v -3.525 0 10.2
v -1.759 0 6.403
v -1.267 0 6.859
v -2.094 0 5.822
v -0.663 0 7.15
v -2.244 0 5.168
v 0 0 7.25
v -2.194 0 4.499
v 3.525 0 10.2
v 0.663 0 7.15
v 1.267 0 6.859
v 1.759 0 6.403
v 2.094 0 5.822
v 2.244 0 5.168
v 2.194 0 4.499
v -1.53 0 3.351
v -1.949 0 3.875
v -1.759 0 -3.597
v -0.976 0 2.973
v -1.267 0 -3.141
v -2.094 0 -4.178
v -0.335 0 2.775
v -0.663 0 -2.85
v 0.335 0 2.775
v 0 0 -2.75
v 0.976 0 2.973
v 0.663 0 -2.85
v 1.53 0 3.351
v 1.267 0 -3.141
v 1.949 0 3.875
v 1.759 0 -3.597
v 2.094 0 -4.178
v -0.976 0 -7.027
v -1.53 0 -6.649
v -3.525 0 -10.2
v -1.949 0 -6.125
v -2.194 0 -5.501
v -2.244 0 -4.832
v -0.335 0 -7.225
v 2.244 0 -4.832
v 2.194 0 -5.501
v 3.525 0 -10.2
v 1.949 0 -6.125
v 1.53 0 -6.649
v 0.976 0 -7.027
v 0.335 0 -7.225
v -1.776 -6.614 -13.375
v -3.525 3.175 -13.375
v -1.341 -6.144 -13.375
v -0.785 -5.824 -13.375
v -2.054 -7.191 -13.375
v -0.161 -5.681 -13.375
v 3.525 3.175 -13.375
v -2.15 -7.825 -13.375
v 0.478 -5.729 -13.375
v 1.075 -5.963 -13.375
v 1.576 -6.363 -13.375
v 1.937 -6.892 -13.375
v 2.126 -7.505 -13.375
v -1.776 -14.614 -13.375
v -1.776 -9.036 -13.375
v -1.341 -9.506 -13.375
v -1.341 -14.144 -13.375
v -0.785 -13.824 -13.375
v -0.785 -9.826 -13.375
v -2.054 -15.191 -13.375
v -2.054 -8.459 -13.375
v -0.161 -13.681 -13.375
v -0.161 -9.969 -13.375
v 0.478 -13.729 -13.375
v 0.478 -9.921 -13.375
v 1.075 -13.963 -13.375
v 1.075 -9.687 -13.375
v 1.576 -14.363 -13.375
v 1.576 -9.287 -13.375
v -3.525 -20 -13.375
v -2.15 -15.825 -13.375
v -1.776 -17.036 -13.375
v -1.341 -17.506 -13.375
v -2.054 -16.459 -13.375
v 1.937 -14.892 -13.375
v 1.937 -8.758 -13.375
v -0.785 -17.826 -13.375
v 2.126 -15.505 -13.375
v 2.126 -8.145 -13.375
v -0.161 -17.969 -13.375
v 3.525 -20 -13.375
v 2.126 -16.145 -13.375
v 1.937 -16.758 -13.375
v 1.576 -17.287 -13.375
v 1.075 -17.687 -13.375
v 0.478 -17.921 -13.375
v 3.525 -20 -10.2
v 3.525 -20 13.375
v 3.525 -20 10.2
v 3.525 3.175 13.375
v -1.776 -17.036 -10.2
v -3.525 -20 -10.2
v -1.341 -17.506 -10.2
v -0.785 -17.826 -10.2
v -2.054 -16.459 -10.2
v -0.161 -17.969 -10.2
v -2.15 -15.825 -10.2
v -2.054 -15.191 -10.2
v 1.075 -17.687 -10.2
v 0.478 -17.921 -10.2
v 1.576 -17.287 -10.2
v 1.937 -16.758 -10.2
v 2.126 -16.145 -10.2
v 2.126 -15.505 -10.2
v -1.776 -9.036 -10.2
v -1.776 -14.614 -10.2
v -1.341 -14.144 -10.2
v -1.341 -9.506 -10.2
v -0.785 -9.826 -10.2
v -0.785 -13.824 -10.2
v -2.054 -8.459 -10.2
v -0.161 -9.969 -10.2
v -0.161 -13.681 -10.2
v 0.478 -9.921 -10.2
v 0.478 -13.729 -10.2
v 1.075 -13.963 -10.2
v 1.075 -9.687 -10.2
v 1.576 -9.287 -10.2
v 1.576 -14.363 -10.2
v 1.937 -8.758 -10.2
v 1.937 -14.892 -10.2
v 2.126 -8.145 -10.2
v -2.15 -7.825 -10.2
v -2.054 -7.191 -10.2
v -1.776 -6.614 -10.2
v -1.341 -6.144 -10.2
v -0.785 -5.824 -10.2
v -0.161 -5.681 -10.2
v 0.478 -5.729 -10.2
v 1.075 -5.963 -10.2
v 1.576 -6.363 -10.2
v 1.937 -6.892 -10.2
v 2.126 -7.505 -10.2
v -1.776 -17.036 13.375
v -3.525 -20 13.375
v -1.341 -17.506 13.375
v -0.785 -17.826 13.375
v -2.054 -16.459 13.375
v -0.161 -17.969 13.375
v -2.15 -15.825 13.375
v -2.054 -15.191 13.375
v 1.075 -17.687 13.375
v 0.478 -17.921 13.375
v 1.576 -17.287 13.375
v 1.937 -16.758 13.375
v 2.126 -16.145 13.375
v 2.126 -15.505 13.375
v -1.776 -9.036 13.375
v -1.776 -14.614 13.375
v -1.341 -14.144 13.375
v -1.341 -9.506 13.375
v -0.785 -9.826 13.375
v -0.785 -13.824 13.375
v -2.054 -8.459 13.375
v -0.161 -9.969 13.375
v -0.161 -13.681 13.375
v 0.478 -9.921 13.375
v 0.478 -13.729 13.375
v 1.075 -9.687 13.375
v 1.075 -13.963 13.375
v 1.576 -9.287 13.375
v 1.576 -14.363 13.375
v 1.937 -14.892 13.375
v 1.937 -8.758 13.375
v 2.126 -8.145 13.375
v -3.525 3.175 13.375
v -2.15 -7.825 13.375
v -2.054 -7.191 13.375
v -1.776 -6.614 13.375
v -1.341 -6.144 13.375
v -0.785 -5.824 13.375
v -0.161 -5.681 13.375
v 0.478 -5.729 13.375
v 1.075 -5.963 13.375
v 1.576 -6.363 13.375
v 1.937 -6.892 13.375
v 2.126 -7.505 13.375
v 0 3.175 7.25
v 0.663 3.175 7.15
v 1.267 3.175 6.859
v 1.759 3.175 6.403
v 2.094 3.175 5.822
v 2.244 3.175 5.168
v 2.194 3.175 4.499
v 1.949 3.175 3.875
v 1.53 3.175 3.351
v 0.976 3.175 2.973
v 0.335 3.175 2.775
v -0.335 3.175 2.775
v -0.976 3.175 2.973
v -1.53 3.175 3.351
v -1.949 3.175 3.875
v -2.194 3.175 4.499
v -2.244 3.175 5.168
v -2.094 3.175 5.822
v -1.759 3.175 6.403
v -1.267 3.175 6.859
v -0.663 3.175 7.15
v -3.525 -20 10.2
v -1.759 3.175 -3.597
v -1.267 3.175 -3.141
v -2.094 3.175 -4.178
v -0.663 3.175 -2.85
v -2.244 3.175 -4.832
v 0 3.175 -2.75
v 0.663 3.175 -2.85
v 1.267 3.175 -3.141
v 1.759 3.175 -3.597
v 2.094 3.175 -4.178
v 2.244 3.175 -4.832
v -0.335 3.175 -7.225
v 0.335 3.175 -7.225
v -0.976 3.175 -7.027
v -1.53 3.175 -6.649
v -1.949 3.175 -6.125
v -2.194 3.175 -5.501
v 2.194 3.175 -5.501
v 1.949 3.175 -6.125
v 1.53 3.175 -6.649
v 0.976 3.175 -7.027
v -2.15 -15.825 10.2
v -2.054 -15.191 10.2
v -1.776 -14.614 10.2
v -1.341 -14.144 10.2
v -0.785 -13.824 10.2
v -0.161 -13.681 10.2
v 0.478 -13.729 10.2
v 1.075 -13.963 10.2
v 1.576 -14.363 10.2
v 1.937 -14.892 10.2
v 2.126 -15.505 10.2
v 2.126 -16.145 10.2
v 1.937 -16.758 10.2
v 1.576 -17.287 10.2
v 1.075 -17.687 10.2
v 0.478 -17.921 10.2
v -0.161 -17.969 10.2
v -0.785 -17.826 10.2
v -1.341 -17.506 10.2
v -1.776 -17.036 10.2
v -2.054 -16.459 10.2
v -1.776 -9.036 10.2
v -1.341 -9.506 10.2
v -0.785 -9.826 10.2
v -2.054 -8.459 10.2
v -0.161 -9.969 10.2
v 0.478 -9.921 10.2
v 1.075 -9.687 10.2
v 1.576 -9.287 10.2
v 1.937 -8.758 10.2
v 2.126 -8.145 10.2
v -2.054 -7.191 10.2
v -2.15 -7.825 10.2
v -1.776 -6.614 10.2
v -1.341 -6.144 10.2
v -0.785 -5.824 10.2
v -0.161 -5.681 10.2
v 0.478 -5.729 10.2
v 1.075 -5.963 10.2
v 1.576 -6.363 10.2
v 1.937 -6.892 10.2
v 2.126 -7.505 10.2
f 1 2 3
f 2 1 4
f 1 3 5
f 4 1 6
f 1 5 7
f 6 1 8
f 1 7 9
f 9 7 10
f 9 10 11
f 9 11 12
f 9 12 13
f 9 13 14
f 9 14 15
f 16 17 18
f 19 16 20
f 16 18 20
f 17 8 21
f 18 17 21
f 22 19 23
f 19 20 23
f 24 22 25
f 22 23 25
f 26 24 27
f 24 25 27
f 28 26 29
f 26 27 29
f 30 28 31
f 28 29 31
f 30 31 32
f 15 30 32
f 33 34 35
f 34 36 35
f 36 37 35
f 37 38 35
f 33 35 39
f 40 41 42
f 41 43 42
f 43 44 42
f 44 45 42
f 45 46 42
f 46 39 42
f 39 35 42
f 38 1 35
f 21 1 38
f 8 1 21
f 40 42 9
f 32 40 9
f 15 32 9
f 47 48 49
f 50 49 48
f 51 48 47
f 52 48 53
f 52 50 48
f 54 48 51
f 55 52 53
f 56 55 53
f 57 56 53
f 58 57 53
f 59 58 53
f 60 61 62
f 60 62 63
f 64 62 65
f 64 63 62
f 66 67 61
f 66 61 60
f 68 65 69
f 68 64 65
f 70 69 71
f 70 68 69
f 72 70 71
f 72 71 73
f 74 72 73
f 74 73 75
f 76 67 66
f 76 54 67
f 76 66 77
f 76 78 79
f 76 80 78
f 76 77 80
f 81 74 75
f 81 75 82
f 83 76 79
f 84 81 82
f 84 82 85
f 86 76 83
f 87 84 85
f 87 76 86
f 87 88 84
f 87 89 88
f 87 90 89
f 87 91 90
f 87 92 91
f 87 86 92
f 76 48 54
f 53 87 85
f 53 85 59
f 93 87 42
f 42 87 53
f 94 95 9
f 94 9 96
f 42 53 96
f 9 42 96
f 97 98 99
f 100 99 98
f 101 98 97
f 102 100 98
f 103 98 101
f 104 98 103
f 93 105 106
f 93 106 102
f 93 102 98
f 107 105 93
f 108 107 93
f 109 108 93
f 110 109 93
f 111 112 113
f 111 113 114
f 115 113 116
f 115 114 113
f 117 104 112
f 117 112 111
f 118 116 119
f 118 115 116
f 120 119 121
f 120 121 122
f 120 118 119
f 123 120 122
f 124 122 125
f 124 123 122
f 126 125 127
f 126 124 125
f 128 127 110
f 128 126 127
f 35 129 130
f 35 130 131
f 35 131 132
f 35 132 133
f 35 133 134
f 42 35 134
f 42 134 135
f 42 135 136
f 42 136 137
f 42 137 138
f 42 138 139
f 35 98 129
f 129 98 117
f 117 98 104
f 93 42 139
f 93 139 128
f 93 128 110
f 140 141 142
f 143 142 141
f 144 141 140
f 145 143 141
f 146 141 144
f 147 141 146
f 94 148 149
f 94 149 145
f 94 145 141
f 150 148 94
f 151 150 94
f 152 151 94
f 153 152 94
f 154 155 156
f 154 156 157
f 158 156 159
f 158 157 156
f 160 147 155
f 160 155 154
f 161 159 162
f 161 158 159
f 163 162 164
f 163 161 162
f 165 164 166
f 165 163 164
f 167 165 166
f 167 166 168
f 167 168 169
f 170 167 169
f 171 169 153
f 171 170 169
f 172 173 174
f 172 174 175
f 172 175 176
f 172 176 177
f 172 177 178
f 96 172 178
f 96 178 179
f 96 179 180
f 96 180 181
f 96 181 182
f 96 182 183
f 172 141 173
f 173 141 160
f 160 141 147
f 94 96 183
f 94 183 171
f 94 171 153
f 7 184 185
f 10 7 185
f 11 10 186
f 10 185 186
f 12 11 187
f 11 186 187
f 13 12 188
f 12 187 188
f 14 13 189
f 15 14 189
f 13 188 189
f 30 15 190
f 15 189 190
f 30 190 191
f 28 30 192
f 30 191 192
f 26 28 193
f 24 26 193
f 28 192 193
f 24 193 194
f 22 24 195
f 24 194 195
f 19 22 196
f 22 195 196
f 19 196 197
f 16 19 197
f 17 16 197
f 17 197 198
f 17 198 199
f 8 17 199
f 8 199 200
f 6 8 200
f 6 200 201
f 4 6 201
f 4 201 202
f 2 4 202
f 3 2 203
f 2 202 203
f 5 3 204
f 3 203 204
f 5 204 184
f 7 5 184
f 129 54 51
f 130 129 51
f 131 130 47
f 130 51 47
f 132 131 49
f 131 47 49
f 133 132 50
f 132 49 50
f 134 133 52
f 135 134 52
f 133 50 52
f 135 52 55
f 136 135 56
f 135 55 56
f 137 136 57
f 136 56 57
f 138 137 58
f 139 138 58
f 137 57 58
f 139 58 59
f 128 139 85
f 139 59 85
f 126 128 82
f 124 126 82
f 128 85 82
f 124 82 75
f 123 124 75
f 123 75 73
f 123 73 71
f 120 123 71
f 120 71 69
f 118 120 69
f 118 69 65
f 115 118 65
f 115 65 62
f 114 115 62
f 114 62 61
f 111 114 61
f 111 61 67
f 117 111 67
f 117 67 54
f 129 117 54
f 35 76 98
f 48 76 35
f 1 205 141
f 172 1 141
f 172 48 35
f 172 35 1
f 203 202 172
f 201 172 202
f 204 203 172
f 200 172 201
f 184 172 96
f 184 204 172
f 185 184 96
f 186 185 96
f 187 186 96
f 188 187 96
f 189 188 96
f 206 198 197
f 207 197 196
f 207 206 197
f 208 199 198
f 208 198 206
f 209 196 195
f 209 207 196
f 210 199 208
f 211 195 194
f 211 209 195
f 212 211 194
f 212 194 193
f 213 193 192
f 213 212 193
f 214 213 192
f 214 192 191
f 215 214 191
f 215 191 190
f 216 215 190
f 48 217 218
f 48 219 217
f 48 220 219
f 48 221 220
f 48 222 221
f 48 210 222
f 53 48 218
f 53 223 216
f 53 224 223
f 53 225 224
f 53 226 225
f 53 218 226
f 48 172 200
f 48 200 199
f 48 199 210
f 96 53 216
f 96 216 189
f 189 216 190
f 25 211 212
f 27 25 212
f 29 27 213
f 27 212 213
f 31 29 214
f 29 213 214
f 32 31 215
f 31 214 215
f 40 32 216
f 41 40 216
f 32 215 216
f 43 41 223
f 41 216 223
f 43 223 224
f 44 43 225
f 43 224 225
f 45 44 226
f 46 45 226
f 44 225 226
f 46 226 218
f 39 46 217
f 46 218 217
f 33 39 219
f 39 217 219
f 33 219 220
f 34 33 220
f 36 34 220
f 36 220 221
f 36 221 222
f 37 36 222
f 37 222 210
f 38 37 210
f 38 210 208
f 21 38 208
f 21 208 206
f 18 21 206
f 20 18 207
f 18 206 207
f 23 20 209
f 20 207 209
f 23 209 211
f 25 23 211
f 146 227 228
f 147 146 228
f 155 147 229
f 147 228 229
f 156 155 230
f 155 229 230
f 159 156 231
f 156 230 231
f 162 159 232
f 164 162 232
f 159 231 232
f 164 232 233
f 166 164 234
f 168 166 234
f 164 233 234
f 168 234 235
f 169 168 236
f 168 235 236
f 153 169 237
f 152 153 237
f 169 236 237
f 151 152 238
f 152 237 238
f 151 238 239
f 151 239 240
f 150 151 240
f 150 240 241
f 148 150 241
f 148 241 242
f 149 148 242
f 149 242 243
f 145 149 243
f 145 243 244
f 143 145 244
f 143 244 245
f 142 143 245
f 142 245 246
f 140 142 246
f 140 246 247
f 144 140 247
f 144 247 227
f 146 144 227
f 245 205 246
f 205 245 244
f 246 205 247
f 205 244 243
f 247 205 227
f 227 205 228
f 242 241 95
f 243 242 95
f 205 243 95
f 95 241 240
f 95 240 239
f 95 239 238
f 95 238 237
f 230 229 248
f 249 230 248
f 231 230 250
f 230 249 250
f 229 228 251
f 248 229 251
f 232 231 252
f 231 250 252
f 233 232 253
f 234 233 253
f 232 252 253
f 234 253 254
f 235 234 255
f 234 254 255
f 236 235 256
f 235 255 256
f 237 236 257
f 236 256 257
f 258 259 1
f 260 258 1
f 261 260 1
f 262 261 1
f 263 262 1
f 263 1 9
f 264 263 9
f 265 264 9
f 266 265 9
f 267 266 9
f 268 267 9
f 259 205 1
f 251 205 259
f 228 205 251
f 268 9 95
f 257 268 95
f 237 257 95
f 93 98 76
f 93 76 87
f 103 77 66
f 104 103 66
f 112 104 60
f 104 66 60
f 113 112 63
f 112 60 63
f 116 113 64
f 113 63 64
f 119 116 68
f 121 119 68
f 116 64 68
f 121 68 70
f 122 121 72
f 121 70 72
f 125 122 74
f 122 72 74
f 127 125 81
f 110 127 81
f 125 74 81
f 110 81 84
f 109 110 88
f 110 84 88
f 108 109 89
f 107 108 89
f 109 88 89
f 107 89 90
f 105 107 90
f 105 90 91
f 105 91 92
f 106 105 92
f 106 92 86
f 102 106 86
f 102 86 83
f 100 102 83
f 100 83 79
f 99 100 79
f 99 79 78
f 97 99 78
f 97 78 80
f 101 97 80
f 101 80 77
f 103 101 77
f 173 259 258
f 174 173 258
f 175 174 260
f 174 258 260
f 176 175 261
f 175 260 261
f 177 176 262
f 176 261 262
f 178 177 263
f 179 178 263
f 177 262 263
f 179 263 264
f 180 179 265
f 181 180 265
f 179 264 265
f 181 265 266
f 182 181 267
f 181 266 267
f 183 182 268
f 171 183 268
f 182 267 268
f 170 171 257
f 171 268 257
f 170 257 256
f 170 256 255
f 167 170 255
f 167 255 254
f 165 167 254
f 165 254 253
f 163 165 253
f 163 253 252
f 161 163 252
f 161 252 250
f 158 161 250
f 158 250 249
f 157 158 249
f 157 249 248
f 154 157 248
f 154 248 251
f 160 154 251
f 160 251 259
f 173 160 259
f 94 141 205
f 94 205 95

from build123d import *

# Parameters (mm, degrees)
SKETCH2_W           = 7.05
SKETCH2_H           = 26.75
BOSS_EXTRUDE1_DEPTH = 3.175
SKETCH3_W           = 7.05
SKETCH3_H           = 3.175
BOSS_EXTRUDE2_DEPTH = 20
SKETCH4_R           = 2.25
CUT_EXTRUDE1_DEPTH  = 3.175
SKETCH5_R           = 2.15
CUT_EXTRUDE2_DEPTH  = 34.585534461


with BuildPart() as part:
    # Sketch2 → Boss-Extrude1 (new body)
    with BuildSketch(Plane(origin=(0, 0, 0), x_dir=(1, 0, 0), z_dir=(0, 1, 0))):
        Rectangle(SKETCH2_W, SKETCH2_H)
    extrude(amount=BOSS_EXTRUDE1_DEPTH)

    # Sketch3 → Boss-Extrude2 (add)
    with BuildSketch(Plane.XZ):
        with Locations((0, 11.7875)):
            Rectangle(SKETCH3_W, SKETCH3_H)
        with Locations((0, -11.7875)):
            Rectangle(SKETCH3_W, SKETCH3_H)
    extrude(amount=BOSS_EXTRUDE2_DEPTH)

    # Sketch4 → Cut-Extrude1 (cut)
    with BuildSketch(Plane(origin=(0, 3.175, 0), x_dir=(1, 0, 0), z_dir=(0, 1, 0))):
        with Locations(Location((0, 5, 0), (0, 0, 270))):
            Circle(SKETCH4_R)
        with Locations(Location((0, -5, 0), (0, 0, 270))):
            Circle(SKETCH4_R)
    extrude(amount=-CUT_EXTRUDE1_DEPTH, mode=Mode.SUBTRACT)

    # Sketch5 → Cut-Extrude2 (cut, through all)
    with BuildSketch(Plane(origin=(0, 0, -13.375), x_dir=(-1, 0, 0), z_dir=(0, 0, -1))):
        with Locations((0, -7.825)):
            Circle(SKETCH5_R)
        with Locations((0, -15.825)):
            Circle(SKETCH5_R)
    extrude(amount=-CUT_EXTRUDE2_DEPTH, mode=Mode.SUBTRACT)


solid = part.part
